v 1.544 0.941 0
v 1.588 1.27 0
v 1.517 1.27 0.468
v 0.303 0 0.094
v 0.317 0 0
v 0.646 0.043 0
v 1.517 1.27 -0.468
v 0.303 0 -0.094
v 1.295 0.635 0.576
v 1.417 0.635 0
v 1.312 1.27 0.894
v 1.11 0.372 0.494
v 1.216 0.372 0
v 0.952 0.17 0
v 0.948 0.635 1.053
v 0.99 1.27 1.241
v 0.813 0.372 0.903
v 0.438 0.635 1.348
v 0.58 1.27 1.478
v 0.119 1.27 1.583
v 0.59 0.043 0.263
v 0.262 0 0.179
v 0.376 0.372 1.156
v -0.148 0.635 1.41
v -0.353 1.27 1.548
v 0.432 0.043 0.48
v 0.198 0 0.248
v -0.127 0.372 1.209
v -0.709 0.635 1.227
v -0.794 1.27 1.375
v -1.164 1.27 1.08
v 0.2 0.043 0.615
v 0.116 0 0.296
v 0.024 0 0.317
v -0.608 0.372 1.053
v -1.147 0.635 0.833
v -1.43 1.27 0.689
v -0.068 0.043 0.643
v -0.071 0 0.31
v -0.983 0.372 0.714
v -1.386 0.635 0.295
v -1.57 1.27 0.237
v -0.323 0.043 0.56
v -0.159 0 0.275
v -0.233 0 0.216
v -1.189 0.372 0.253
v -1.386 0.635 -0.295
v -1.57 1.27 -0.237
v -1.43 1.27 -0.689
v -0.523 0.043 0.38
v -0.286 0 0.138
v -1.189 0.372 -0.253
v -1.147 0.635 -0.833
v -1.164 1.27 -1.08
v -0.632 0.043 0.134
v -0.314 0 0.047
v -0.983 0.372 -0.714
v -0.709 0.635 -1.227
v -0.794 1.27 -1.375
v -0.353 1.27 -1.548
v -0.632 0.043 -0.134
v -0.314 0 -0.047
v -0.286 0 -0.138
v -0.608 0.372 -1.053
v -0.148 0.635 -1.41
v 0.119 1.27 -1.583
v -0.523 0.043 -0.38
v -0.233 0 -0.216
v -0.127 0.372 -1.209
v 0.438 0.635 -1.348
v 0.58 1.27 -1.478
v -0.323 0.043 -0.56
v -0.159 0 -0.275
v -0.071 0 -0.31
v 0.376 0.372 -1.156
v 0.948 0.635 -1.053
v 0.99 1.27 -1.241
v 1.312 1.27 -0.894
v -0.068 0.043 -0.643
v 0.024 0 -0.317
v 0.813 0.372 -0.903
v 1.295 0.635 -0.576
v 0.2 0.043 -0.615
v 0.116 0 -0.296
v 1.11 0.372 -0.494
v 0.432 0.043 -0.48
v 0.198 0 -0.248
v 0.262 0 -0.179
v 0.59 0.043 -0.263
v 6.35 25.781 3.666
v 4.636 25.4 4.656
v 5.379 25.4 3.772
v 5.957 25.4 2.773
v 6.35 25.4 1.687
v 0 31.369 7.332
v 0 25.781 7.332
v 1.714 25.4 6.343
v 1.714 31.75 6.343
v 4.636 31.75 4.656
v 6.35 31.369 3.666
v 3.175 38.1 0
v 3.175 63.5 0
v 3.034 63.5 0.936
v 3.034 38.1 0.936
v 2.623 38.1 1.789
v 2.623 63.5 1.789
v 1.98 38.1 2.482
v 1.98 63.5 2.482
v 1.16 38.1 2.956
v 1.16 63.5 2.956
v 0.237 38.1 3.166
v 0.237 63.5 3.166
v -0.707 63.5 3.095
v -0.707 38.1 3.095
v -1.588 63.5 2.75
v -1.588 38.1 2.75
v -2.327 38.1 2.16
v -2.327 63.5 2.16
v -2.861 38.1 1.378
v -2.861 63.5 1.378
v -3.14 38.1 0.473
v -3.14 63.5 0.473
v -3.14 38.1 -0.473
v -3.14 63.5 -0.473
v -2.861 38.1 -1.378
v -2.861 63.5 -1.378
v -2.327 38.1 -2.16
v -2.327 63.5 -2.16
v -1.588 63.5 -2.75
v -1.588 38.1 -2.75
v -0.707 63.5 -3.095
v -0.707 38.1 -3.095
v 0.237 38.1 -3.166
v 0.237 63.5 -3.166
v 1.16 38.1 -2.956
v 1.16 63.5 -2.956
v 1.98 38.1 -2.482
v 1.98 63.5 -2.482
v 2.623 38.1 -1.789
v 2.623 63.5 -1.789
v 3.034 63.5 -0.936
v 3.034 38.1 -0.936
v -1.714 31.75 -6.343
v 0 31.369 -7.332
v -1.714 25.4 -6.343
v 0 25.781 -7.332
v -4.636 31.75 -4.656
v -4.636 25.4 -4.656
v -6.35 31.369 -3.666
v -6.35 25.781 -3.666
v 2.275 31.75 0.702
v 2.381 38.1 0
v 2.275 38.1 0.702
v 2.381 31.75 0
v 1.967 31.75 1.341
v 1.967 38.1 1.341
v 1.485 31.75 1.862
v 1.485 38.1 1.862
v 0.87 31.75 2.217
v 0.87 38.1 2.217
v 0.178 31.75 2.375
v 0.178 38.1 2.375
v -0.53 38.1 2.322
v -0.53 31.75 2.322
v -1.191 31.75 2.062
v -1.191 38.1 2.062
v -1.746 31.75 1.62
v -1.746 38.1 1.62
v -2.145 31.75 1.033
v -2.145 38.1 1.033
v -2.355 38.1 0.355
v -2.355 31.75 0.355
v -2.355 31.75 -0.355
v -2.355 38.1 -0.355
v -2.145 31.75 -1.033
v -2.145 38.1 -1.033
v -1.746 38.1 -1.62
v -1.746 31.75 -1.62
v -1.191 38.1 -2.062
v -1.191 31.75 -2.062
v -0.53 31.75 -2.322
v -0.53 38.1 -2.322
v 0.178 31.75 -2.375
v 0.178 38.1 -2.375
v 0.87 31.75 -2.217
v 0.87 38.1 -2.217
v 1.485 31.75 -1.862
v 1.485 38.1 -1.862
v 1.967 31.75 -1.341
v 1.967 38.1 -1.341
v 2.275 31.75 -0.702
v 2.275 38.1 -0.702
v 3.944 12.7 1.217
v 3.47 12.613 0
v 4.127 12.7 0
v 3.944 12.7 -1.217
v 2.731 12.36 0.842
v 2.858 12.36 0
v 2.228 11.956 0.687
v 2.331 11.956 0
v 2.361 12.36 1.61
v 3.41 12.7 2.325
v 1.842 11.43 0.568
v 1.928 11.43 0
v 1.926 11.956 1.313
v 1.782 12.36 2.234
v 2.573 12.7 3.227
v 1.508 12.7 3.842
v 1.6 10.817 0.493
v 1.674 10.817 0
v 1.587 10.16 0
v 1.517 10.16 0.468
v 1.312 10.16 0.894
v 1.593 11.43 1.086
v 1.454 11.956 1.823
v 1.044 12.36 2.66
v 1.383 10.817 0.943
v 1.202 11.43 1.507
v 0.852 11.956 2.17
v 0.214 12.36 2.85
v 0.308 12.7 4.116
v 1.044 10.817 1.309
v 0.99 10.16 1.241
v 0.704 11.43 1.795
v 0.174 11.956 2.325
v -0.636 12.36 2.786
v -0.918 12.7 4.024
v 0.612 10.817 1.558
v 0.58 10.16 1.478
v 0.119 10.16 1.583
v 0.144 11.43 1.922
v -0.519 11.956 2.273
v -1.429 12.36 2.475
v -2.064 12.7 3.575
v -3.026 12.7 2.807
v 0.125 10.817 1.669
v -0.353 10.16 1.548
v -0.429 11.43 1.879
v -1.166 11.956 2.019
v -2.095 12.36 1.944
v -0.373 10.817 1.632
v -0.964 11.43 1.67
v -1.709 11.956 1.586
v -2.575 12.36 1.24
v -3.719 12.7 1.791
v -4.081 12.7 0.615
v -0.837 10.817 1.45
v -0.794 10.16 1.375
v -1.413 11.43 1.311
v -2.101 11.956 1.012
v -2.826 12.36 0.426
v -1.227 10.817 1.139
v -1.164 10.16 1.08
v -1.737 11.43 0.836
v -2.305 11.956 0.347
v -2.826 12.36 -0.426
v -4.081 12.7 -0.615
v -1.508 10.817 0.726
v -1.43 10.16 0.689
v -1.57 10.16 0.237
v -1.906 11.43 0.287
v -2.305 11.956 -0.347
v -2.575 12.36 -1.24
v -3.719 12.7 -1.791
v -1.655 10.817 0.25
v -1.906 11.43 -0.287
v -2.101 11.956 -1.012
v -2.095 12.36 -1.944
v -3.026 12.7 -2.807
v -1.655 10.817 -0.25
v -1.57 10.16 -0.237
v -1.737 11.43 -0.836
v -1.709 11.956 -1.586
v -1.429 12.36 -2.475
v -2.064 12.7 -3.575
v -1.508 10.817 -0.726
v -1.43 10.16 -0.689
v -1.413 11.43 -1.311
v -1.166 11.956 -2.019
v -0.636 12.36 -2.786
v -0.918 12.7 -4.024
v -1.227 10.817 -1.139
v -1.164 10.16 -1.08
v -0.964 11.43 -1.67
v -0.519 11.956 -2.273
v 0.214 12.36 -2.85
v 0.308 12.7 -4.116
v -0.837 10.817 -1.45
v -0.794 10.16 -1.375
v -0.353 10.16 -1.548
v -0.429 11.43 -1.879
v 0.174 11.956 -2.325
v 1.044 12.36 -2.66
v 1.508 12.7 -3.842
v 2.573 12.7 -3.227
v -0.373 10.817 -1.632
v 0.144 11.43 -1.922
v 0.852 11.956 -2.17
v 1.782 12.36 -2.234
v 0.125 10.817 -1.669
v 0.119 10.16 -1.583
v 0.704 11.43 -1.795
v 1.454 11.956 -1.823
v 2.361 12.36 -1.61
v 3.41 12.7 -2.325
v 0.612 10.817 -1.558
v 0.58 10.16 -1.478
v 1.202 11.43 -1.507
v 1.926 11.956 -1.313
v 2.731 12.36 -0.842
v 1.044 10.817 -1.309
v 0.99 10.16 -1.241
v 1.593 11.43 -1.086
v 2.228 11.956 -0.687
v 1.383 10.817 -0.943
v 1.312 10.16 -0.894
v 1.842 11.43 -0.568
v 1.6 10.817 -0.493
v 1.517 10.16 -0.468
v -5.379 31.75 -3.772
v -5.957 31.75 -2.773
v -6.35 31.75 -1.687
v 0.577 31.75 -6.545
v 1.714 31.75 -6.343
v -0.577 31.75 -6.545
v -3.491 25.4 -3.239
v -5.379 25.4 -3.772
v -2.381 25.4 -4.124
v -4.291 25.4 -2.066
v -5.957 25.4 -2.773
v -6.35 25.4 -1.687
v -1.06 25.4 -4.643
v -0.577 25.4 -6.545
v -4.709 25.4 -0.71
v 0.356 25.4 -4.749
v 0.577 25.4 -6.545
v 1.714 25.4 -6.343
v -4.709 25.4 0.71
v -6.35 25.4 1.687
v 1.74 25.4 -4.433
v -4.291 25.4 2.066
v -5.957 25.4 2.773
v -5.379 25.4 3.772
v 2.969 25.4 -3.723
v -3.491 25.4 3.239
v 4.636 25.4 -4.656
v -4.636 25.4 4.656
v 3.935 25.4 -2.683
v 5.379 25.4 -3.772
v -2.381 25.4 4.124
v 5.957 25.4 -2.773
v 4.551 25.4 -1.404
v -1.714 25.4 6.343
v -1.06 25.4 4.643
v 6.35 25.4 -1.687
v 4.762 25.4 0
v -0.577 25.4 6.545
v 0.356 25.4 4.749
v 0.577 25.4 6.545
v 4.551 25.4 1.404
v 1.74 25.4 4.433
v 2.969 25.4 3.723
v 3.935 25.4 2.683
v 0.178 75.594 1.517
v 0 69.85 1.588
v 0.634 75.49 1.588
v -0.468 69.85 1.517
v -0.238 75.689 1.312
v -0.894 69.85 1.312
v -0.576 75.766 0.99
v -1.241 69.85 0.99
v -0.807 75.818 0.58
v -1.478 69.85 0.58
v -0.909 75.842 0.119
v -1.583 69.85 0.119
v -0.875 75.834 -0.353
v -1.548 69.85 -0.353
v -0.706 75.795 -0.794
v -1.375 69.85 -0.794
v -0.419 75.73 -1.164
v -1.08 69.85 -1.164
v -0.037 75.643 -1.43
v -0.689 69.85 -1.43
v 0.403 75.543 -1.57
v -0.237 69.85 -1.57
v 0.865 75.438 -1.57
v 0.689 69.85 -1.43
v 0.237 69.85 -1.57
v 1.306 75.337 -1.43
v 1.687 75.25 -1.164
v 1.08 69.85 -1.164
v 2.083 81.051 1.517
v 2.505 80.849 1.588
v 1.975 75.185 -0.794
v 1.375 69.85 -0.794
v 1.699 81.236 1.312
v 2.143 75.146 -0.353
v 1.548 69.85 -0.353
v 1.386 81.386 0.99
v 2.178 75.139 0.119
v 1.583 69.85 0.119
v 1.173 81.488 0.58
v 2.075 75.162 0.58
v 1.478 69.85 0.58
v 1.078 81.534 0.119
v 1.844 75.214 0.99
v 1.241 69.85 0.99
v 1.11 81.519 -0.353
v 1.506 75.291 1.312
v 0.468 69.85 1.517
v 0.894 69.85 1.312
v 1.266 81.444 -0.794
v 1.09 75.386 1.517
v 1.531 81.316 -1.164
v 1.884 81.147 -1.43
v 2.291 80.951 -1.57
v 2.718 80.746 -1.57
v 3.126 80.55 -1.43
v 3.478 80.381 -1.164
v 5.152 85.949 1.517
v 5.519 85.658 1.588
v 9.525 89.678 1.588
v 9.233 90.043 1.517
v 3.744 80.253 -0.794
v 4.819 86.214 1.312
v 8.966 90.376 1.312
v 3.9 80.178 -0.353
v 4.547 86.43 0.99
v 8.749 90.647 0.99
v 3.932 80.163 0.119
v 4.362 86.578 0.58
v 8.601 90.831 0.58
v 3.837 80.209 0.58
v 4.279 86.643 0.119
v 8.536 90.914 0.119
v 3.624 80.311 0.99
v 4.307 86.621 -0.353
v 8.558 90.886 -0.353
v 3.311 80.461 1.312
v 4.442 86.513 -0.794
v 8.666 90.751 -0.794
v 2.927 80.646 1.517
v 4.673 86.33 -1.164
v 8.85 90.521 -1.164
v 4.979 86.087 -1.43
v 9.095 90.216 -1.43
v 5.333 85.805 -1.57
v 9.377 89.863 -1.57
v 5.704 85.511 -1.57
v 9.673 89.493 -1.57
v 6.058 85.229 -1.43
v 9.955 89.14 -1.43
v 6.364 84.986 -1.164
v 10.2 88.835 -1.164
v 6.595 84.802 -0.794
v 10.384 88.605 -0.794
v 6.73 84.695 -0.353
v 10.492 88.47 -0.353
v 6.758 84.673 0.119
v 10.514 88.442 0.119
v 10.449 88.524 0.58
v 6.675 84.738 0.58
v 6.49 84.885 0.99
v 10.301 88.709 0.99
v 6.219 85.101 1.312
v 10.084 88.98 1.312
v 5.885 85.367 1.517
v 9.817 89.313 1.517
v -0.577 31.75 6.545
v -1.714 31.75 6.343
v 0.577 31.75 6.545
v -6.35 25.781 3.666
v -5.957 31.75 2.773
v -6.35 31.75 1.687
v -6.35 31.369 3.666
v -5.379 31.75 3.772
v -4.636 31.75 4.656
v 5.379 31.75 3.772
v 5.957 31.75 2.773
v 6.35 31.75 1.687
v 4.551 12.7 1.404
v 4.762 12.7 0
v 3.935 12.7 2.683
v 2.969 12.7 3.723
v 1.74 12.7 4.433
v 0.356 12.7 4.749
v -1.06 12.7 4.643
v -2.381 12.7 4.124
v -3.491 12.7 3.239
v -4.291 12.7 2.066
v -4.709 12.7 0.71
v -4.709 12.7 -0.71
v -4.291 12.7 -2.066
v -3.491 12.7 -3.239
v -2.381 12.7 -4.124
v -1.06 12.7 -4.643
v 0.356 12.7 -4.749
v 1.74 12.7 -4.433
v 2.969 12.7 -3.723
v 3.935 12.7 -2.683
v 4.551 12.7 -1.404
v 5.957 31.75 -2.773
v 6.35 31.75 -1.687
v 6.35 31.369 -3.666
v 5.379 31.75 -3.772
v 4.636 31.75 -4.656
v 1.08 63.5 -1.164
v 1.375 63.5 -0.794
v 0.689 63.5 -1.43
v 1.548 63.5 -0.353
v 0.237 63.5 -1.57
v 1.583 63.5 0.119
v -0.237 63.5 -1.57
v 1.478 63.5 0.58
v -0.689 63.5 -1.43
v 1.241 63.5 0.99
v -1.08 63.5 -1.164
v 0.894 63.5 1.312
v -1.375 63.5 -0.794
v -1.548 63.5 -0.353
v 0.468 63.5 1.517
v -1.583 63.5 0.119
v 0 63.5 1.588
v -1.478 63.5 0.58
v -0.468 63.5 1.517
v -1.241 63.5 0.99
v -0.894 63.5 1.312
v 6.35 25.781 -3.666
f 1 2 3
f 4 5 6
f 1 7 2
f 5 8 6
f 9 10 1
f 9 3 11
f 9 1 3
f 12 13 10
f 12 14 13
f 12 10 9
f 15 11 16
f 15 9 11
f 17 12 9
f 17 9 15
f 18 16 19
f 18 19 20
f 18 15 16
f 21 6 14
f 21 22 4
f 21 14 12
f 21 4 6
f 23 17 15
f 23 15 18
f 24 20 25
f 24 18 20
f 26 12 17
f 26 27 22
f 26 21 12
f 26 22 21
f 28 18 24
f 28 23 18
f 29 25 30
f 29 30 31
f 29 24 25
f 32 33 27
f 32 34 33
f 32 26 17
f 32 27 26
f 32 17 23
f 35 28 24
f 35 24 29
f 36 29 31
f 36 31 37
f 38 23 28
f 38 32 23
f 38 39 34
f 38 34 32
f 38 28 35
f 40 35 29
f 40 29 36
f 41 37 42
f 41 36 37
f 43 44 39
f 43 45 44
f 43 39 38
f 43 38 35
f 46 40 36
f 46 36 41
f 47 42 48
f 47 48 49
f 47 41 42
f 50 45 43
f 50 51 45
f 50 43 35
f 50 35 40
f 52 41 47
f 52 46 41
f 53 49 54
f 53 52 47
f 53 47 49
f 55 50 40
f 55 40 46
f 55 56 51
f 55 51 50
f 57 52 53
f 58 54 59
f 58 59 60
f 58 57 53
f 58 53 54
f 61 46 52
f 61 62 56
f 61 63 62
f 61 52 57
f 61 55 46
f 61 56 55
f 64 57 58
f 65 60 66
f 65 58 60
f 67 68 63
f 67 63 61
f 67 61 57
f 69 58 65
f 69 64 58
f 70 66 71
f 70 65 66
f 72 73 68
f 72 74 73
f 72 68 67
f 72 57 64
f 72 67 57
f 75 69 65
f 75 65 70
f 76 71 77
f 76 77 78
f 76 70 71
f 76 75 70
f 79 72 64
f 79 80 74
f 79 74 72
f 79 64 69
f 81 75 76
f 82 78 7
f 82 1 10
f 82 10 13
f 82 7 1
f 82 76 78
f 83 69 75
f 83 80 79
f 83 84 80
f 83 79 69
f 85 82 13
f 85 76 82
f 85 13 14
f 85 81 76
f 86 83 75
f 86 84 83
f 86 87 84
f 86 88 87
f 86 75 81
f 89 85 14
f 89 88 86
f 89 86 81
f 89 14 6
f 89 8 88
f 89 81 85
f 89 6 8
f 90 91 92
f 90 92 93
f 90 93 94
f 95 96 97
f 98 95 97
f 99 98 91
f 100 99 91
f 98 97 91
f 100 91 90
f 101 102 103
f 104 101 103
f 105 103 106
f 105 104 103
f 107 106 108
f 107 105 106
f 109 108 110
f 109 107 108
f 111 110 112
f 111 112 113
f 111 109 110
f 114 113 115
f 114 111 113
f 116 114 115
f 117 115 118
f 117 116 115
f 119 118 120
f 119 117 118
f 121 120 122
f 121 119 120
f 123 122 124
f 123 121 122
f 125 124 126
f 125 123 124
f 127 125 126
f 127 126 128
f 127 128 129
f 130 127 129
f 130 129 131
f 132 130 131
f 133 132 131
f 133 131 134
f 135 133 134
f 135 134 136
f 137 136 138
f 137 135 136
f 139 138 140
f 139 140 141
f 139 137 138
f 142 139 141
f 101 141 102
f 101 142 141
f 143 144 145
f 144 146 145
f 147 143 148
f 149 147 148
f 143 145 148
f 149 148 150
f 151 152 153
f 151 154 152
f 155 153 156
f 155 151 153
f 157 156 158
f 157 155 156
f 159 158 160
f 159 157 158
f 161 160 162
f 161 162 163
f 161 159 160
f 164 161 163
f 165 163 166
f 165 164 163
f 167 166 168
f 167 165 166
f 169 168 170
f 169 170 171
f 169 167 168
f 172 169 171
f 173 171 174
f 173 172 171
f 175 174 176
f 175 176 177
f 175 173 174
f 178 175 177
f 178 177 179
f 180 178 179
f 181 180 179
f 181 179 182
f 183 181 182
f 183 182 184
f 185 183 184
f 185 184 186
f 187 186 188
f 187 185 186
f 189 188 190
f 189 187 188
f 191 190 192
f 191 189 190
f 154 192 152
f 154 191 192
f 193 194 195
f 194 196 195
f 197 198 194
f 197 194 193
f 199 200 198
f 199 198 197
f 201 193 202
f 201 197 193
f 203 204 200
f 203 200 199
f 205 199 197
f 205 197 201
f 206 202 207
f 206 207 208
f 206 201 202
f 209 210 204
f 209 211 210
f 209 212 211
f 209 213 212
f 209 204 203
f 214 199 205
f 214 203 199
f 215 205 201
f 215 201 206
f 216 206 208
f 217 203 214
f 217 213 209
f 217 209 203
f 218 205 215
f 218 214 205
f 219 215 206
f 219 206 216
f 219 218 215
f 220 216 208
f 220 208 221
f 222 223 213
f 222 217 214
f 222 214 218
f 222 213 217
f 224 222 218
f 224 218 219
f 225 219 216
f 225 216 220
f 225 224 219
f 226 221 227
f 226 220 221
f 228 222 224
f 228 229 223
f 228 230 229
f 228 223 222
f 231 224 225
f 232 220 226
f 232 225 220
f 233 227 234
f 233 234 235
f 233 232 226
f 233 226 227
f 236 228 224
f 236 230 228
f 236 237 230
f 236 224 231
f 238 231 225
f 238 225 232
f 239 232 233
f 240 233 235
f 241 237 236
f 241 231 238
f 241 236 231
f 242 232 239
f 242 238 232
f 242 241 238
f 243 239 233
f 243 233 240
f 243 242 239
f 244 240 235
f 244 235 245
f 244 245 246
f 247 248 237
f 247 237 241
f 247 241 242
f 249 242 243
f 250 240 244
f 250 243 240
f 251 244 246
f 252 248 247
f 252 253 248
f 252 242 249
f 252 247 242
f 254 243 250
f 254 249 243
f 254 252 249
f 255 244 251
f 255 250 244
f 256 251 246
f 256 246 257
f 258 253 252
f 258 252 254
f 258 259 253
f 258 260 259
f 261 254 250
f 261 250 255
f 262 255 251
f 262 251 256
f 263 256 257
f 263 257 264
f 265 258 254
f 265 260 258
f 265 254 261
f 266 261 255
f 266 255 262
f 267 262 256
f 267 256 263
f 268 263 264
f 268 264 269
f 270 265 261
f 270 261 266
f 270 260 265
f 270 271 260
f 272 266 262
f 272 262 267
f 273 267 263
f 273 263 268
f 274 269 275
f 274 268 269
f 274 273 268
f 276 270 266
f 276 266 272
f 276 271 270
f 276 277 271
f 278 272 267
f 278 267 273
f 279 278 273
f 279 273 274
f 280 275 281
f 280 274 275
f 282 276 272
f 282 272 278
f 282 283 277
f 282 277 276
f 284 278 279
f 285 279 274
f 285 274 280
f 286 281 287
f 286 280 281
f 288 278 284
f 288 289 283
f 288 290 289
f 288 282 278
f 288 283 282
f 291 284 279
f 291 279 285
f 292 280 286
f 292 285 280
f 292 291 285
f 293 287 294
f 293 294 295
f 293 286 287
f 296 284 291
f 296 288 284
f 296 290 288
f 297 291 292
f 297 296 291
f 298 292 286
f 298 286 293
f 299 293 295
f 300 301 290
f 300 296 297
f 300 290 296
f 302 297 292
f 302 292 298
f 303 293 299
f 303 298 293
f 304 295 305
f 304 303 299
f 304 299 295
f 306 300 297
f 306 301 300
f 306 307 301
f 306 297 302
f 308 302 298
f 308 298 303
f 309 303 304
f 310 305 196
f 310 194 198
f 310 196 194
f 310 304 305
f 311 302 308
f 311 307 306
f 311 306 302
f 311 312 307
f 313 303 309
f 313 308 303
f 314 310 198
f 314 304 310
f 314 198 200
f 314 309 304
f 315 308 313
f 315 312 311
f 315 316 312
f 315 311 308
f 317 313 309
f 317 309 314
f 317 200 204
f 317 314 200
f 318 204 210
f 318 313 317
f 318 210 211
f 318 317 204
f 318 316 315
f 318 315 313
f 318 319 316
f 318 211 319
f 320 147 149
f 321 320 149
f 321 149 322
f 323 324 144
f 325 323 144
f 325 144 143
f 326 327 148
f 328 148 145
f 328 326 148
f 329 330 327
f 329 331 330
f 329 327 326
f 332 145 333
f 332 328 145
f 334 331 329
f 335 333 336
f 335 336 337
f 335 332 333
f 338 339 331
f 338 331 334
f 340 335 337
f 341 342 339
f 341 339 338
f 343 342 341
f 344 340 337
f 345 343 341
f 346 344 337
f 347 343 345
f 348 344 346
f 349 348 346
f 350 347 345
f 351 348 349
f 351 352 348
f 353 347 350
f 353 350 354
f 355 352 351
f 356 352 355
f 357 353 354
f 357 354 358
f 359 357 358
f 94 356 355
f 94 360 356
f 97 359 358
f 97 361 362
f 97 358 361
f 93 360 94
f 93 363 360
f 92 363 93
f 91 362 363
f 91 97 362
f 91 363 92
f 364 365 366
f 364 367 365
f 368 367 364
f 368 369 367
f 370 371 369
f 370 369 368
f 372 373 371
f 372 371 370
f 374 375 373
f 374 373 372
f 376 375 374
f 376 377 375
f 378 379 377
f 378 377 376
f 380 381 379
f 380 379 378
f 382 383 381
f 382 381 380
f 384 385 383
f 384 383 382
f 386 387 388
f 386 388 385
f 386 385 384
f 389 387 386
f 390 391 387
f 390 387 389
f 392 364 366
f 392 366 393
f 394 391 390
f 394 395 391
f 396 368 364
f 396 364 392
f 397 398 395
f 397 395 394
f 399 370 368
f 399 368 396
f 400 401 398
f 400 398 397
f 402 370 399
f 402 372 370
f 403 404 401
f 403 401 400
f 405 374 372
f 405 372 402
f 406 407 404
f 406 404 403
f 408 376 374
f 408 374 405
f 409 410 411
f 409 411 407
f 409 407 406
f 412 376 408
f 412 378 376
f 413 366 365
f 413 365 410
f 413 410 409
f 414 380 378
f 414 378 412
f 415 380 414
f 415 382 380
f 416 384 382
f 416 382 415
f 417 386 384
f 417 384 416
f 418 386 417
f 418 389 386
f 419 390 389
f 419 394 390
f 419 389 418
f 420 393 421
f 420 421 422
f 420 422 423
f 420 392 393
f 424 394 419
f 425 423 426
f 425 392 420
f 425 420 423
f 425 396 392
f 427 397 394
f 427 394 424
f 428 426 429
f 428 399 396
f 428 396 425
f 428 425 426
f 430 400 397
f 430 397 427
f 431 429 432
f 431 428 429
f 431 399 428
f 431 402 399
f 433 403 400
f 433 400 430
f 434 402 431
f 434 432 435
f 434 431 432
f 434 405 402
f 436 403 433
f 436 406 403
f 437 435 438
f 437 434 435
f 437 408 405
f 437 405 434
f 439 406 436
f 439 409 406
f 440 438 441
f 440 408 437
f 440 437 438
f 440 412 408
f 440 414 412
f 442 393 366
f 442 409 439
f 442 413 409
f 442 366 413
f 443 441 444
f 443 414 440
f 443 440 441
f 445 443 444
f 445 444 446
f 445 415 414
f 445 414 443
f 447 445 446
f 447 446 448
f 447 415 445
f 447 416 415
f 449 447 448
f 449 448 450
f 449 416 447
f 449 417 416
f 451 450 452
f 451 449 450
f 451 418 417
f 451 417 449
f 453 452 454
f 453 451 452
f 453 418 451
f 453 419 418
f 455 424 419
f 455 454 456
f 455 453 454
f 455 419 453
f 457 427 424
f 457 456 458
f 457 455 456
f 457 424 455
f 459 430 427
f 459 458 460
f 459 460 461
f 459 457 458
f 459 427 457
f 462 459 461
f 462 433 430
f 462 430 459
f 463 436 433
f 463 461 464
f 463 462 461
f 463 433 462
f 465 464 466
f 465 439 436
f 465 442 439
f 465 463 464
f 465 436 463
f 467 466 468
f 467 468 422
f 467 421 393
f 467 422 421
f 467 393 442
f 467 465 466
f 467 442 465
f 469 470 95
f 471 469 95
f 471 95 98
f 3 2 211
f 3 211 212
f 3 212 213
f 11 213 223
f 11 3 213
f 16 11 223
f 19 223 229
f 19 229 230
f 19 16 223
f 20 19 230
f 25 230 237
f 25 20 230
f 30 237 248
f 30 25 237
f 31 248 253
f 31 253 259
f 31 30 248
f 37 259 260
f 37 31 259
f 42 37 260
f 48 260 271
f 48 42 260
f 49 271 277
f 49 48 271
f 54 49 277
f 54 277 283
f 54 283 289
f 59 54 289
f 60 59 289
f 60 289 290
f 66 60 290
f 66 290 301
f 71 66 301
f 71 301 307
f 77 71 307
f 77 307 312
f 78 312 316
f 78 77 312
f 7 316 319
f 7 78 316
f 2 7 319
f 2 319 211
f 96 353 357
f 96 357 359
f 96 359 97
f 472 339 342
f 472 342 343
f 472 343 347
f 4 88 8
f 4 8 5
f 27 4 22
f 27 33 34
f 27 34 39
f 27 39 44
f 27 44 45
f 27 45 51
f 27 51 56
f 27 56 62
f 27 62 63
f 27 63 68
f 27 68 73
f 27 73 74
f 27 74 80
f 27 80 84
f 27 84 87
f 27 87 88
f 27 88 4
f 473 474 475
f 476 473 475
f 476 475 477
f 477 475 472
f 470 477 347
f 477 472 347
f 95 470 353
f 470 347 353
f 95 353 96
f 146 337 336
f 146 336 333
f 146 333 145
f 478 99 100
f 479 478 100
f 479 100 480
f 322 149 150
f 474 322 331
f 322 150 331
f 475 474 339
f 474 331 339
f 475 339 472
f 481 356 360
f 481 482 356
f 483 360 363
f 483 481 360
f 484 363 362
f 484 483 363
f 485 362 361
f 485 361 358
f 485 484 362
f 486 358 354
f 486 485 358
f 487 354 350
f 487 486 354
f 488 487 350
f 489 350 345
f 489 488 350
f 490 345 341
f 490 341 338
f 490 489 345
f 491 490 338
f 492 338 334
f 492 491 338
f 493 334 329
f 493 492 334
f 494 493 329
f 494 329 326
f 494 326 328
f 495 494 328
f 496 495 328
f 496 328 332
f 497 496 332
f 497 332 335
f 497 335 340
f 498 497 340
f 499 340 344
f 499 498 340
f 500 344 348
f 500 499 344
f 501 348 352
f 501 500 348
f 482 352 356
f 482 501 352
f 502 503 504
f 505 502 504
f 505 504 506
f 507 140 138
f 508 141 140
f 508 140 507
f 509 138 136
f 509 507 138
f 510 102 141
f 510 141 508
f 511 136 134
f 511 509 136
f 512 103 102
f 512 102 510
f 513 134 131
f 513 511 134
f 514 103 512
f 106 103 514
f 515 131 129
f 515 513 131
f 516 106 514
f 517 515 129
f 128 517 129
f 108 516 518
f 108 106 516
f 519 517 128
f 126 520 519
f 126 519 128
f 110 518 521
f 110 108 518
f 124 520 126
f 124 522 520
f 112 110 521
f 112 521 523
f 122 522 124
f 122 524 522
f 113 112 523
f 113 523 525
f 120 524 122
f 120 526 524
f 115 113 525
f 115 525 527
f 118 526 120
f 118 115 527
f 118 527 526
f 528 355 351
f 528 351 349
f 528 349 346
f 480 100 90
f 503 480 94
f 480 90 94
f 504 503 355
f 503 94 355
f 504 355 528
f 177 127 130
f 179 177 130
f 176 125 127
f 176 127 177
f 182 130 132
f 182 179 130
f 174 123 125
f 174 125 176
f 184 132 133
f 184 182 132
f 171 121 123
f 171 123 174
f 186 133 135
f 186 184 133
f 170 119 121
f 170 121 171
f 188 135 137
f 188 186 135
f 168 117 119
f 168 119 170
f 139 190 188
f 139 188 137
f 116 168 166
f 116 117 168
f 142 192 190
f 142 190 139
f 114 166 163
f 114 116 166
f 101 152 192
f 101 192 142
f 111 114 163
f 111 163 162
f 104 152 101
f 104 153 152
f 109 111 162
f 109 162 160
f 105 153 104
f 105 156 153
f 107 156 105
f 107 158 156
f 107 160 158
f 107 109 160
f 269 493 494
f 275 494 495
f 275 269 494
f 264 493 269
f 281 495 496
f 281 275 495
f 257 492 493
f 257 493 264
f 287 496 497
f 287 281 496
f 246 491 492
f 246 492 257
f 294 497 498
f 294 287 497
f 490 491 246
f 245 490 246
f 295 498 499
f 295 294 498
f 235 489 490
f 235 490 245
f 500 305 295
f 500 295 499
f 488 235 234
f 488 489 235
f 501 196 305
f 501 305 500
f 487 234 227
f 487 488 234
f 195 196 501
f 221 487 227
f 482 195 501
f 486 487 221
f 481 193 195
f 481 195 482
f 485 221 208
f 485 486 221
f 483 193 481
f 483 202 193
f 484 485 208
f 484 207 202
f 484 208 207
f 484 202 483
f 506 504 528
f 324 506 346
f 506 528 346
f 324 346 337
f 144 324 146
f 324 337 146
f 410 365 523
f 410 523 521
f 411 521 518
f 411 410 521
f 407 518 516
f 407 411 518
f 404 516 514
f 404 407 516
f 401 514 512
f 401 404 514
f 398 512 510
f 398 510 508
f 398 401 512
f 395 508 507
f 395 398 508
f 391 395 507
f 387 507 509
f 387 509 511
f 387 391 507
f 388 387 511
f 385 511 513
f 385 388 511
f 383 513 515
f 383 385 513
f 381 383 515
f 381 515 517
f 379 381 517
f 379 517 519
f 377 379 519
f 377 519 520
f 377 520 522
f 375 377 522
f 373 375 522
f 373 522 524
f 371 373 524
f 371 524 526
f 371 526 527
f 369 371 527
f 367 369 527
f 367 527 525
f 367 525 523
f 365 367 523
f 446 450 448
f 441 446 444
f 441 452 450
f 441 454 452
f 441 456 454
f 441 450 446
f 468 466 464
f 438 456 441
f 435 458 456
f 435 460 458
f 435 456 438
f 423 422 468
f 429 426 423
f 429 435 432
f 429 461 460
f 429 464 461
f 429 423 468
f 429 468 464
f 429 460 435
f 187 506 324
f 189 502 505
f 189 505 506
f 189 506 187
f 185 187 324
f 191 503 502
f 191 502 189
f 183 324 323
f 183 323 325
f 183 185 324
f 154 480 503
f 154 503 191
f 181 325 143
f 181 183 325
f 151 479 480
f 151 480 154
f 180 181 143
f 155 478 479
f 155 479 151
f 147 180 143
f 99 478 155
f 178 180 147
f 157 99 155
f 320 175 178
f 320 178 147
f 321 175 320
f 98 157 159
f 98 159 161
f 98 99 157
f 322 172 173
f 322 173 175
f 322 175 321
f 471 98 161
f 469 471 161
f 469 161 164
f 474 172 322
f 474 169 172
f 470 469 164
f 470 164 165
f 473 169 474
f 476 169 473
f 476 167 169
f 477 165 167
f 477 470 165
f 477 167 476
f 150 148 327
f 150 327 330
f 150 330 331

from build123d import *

# Parameters (mm, degrees)
SKETCH2_OUTSIDE_W  = 41.992
SKETCH2_OUTSIDE_H  = 41.992
CUT_EXTRUDE1_DEPTH = 64.5
FILLET1_R          = 2.54
FILLET2_R          = 1.27
SWEEP1_PROFILE_R   = 1.5875


with BuildPart() as part:
    # Sketch1 → Revolve1 (revolve)
    with BuildSketch(Plane.XY):
        Polygon((0, 0), (0, 63.5), (3.175, 63.5), (3.175, 38.1), (2.38125, 38.1), (2.38125, 31.75), (12.7, 31.75), (12.7, 25.4), (4.7625, 25.4), (4.7625, 12.7), (1.5875, 12.7), (1.5875, 0), align=None)
    revolve(axis=Axis((0, 0, 0), (0, -1, 0)))

    # Sketch2 outside → Cut-Extrude1 (cut, through all)
    with BuildSketch(Plane(origin=(0, 0, 0), x_dir=(1, 0, 0), z_dir=(0, 1, 0))):
        Rectangle(SKETCH2_OUTSIDE_W, SKETCH2_OUTSIDE_H)
        Polygon((6.35, 3.666174209), (0, 7.332348419), (-6.35, 3.666174209), (-6.35, -3.666174209), (0, -7.332348419), (6.35, -3.666174209), align=None, mode=Mode.SUBTRACT)
    extrude(amount=CUT_EXTRUDE1_DEPTH, mode=Mode.SUBTRACT)

    # Sketch3 → Cut-Revolve1 (revolve, cut)
    with BuildSketch(Plane(origin=(0, 0, 0), x_dir=(0, 0, -1), z_dir=(1, 0, 0))):
        with BuildLine():
            Line((7.332348419, 31.369), (7.332348419, 25.781))
            ThreePointArc((7.332348419, 25.781), (6.9545441, 25.584108638), (6.570348419, 25.4))
            ThreePointArc((6.570348419, 25.4), (12.560590782, 25.250588883), (17.545931088, 28.575))
            ThreePointArc((17.545931088, 28.575), (12.560590782, 31.899411117), (6.570348419, 31.75))
            ThreePointArc((6.570348419, 31.75), (6.9545441, 31.565891362), (7.332348419, 31.369))
        make_face()
    revolve(axis=Axis((0, 0, 0), (0, 1, 0)), mode=Mode.SUBTRACT)

    # Fillet1
    fillet1_edges = [part.edges().sort_by_distance(p)[0] for p in [
        (-1.5875, 12.7, 0),
    ]]
    fillet(fillet1_edges, radius=FILLET1_R)

    # Fillet2
    fillet2_edges = [part.edges().sort_by_distance(p)[0] for p in [
        (-1.5875, 0, 0),
    ]]
    fillet(fillet2_edges, radius=FILLET2_R)

    # Sweep1: sweep along a path in Sketch4
    with BuildLine(Plane.XY) as sweep1_path:
        Line((0, 63.5), (0, 69.85))
        ThreePointArc((0, 69.85), (2.504749401, 80.848522628), (9.525, 89.677868645))
    # Sweep1 profile (on start of the path) → Sweep1 (sweep)
    with BuildSketch(Plane.ZX.offset(63.5)):
        Circle(SWEEP1_PROFILE_R)
    sweep(path=sweep1_path.line)


solid = part.part
